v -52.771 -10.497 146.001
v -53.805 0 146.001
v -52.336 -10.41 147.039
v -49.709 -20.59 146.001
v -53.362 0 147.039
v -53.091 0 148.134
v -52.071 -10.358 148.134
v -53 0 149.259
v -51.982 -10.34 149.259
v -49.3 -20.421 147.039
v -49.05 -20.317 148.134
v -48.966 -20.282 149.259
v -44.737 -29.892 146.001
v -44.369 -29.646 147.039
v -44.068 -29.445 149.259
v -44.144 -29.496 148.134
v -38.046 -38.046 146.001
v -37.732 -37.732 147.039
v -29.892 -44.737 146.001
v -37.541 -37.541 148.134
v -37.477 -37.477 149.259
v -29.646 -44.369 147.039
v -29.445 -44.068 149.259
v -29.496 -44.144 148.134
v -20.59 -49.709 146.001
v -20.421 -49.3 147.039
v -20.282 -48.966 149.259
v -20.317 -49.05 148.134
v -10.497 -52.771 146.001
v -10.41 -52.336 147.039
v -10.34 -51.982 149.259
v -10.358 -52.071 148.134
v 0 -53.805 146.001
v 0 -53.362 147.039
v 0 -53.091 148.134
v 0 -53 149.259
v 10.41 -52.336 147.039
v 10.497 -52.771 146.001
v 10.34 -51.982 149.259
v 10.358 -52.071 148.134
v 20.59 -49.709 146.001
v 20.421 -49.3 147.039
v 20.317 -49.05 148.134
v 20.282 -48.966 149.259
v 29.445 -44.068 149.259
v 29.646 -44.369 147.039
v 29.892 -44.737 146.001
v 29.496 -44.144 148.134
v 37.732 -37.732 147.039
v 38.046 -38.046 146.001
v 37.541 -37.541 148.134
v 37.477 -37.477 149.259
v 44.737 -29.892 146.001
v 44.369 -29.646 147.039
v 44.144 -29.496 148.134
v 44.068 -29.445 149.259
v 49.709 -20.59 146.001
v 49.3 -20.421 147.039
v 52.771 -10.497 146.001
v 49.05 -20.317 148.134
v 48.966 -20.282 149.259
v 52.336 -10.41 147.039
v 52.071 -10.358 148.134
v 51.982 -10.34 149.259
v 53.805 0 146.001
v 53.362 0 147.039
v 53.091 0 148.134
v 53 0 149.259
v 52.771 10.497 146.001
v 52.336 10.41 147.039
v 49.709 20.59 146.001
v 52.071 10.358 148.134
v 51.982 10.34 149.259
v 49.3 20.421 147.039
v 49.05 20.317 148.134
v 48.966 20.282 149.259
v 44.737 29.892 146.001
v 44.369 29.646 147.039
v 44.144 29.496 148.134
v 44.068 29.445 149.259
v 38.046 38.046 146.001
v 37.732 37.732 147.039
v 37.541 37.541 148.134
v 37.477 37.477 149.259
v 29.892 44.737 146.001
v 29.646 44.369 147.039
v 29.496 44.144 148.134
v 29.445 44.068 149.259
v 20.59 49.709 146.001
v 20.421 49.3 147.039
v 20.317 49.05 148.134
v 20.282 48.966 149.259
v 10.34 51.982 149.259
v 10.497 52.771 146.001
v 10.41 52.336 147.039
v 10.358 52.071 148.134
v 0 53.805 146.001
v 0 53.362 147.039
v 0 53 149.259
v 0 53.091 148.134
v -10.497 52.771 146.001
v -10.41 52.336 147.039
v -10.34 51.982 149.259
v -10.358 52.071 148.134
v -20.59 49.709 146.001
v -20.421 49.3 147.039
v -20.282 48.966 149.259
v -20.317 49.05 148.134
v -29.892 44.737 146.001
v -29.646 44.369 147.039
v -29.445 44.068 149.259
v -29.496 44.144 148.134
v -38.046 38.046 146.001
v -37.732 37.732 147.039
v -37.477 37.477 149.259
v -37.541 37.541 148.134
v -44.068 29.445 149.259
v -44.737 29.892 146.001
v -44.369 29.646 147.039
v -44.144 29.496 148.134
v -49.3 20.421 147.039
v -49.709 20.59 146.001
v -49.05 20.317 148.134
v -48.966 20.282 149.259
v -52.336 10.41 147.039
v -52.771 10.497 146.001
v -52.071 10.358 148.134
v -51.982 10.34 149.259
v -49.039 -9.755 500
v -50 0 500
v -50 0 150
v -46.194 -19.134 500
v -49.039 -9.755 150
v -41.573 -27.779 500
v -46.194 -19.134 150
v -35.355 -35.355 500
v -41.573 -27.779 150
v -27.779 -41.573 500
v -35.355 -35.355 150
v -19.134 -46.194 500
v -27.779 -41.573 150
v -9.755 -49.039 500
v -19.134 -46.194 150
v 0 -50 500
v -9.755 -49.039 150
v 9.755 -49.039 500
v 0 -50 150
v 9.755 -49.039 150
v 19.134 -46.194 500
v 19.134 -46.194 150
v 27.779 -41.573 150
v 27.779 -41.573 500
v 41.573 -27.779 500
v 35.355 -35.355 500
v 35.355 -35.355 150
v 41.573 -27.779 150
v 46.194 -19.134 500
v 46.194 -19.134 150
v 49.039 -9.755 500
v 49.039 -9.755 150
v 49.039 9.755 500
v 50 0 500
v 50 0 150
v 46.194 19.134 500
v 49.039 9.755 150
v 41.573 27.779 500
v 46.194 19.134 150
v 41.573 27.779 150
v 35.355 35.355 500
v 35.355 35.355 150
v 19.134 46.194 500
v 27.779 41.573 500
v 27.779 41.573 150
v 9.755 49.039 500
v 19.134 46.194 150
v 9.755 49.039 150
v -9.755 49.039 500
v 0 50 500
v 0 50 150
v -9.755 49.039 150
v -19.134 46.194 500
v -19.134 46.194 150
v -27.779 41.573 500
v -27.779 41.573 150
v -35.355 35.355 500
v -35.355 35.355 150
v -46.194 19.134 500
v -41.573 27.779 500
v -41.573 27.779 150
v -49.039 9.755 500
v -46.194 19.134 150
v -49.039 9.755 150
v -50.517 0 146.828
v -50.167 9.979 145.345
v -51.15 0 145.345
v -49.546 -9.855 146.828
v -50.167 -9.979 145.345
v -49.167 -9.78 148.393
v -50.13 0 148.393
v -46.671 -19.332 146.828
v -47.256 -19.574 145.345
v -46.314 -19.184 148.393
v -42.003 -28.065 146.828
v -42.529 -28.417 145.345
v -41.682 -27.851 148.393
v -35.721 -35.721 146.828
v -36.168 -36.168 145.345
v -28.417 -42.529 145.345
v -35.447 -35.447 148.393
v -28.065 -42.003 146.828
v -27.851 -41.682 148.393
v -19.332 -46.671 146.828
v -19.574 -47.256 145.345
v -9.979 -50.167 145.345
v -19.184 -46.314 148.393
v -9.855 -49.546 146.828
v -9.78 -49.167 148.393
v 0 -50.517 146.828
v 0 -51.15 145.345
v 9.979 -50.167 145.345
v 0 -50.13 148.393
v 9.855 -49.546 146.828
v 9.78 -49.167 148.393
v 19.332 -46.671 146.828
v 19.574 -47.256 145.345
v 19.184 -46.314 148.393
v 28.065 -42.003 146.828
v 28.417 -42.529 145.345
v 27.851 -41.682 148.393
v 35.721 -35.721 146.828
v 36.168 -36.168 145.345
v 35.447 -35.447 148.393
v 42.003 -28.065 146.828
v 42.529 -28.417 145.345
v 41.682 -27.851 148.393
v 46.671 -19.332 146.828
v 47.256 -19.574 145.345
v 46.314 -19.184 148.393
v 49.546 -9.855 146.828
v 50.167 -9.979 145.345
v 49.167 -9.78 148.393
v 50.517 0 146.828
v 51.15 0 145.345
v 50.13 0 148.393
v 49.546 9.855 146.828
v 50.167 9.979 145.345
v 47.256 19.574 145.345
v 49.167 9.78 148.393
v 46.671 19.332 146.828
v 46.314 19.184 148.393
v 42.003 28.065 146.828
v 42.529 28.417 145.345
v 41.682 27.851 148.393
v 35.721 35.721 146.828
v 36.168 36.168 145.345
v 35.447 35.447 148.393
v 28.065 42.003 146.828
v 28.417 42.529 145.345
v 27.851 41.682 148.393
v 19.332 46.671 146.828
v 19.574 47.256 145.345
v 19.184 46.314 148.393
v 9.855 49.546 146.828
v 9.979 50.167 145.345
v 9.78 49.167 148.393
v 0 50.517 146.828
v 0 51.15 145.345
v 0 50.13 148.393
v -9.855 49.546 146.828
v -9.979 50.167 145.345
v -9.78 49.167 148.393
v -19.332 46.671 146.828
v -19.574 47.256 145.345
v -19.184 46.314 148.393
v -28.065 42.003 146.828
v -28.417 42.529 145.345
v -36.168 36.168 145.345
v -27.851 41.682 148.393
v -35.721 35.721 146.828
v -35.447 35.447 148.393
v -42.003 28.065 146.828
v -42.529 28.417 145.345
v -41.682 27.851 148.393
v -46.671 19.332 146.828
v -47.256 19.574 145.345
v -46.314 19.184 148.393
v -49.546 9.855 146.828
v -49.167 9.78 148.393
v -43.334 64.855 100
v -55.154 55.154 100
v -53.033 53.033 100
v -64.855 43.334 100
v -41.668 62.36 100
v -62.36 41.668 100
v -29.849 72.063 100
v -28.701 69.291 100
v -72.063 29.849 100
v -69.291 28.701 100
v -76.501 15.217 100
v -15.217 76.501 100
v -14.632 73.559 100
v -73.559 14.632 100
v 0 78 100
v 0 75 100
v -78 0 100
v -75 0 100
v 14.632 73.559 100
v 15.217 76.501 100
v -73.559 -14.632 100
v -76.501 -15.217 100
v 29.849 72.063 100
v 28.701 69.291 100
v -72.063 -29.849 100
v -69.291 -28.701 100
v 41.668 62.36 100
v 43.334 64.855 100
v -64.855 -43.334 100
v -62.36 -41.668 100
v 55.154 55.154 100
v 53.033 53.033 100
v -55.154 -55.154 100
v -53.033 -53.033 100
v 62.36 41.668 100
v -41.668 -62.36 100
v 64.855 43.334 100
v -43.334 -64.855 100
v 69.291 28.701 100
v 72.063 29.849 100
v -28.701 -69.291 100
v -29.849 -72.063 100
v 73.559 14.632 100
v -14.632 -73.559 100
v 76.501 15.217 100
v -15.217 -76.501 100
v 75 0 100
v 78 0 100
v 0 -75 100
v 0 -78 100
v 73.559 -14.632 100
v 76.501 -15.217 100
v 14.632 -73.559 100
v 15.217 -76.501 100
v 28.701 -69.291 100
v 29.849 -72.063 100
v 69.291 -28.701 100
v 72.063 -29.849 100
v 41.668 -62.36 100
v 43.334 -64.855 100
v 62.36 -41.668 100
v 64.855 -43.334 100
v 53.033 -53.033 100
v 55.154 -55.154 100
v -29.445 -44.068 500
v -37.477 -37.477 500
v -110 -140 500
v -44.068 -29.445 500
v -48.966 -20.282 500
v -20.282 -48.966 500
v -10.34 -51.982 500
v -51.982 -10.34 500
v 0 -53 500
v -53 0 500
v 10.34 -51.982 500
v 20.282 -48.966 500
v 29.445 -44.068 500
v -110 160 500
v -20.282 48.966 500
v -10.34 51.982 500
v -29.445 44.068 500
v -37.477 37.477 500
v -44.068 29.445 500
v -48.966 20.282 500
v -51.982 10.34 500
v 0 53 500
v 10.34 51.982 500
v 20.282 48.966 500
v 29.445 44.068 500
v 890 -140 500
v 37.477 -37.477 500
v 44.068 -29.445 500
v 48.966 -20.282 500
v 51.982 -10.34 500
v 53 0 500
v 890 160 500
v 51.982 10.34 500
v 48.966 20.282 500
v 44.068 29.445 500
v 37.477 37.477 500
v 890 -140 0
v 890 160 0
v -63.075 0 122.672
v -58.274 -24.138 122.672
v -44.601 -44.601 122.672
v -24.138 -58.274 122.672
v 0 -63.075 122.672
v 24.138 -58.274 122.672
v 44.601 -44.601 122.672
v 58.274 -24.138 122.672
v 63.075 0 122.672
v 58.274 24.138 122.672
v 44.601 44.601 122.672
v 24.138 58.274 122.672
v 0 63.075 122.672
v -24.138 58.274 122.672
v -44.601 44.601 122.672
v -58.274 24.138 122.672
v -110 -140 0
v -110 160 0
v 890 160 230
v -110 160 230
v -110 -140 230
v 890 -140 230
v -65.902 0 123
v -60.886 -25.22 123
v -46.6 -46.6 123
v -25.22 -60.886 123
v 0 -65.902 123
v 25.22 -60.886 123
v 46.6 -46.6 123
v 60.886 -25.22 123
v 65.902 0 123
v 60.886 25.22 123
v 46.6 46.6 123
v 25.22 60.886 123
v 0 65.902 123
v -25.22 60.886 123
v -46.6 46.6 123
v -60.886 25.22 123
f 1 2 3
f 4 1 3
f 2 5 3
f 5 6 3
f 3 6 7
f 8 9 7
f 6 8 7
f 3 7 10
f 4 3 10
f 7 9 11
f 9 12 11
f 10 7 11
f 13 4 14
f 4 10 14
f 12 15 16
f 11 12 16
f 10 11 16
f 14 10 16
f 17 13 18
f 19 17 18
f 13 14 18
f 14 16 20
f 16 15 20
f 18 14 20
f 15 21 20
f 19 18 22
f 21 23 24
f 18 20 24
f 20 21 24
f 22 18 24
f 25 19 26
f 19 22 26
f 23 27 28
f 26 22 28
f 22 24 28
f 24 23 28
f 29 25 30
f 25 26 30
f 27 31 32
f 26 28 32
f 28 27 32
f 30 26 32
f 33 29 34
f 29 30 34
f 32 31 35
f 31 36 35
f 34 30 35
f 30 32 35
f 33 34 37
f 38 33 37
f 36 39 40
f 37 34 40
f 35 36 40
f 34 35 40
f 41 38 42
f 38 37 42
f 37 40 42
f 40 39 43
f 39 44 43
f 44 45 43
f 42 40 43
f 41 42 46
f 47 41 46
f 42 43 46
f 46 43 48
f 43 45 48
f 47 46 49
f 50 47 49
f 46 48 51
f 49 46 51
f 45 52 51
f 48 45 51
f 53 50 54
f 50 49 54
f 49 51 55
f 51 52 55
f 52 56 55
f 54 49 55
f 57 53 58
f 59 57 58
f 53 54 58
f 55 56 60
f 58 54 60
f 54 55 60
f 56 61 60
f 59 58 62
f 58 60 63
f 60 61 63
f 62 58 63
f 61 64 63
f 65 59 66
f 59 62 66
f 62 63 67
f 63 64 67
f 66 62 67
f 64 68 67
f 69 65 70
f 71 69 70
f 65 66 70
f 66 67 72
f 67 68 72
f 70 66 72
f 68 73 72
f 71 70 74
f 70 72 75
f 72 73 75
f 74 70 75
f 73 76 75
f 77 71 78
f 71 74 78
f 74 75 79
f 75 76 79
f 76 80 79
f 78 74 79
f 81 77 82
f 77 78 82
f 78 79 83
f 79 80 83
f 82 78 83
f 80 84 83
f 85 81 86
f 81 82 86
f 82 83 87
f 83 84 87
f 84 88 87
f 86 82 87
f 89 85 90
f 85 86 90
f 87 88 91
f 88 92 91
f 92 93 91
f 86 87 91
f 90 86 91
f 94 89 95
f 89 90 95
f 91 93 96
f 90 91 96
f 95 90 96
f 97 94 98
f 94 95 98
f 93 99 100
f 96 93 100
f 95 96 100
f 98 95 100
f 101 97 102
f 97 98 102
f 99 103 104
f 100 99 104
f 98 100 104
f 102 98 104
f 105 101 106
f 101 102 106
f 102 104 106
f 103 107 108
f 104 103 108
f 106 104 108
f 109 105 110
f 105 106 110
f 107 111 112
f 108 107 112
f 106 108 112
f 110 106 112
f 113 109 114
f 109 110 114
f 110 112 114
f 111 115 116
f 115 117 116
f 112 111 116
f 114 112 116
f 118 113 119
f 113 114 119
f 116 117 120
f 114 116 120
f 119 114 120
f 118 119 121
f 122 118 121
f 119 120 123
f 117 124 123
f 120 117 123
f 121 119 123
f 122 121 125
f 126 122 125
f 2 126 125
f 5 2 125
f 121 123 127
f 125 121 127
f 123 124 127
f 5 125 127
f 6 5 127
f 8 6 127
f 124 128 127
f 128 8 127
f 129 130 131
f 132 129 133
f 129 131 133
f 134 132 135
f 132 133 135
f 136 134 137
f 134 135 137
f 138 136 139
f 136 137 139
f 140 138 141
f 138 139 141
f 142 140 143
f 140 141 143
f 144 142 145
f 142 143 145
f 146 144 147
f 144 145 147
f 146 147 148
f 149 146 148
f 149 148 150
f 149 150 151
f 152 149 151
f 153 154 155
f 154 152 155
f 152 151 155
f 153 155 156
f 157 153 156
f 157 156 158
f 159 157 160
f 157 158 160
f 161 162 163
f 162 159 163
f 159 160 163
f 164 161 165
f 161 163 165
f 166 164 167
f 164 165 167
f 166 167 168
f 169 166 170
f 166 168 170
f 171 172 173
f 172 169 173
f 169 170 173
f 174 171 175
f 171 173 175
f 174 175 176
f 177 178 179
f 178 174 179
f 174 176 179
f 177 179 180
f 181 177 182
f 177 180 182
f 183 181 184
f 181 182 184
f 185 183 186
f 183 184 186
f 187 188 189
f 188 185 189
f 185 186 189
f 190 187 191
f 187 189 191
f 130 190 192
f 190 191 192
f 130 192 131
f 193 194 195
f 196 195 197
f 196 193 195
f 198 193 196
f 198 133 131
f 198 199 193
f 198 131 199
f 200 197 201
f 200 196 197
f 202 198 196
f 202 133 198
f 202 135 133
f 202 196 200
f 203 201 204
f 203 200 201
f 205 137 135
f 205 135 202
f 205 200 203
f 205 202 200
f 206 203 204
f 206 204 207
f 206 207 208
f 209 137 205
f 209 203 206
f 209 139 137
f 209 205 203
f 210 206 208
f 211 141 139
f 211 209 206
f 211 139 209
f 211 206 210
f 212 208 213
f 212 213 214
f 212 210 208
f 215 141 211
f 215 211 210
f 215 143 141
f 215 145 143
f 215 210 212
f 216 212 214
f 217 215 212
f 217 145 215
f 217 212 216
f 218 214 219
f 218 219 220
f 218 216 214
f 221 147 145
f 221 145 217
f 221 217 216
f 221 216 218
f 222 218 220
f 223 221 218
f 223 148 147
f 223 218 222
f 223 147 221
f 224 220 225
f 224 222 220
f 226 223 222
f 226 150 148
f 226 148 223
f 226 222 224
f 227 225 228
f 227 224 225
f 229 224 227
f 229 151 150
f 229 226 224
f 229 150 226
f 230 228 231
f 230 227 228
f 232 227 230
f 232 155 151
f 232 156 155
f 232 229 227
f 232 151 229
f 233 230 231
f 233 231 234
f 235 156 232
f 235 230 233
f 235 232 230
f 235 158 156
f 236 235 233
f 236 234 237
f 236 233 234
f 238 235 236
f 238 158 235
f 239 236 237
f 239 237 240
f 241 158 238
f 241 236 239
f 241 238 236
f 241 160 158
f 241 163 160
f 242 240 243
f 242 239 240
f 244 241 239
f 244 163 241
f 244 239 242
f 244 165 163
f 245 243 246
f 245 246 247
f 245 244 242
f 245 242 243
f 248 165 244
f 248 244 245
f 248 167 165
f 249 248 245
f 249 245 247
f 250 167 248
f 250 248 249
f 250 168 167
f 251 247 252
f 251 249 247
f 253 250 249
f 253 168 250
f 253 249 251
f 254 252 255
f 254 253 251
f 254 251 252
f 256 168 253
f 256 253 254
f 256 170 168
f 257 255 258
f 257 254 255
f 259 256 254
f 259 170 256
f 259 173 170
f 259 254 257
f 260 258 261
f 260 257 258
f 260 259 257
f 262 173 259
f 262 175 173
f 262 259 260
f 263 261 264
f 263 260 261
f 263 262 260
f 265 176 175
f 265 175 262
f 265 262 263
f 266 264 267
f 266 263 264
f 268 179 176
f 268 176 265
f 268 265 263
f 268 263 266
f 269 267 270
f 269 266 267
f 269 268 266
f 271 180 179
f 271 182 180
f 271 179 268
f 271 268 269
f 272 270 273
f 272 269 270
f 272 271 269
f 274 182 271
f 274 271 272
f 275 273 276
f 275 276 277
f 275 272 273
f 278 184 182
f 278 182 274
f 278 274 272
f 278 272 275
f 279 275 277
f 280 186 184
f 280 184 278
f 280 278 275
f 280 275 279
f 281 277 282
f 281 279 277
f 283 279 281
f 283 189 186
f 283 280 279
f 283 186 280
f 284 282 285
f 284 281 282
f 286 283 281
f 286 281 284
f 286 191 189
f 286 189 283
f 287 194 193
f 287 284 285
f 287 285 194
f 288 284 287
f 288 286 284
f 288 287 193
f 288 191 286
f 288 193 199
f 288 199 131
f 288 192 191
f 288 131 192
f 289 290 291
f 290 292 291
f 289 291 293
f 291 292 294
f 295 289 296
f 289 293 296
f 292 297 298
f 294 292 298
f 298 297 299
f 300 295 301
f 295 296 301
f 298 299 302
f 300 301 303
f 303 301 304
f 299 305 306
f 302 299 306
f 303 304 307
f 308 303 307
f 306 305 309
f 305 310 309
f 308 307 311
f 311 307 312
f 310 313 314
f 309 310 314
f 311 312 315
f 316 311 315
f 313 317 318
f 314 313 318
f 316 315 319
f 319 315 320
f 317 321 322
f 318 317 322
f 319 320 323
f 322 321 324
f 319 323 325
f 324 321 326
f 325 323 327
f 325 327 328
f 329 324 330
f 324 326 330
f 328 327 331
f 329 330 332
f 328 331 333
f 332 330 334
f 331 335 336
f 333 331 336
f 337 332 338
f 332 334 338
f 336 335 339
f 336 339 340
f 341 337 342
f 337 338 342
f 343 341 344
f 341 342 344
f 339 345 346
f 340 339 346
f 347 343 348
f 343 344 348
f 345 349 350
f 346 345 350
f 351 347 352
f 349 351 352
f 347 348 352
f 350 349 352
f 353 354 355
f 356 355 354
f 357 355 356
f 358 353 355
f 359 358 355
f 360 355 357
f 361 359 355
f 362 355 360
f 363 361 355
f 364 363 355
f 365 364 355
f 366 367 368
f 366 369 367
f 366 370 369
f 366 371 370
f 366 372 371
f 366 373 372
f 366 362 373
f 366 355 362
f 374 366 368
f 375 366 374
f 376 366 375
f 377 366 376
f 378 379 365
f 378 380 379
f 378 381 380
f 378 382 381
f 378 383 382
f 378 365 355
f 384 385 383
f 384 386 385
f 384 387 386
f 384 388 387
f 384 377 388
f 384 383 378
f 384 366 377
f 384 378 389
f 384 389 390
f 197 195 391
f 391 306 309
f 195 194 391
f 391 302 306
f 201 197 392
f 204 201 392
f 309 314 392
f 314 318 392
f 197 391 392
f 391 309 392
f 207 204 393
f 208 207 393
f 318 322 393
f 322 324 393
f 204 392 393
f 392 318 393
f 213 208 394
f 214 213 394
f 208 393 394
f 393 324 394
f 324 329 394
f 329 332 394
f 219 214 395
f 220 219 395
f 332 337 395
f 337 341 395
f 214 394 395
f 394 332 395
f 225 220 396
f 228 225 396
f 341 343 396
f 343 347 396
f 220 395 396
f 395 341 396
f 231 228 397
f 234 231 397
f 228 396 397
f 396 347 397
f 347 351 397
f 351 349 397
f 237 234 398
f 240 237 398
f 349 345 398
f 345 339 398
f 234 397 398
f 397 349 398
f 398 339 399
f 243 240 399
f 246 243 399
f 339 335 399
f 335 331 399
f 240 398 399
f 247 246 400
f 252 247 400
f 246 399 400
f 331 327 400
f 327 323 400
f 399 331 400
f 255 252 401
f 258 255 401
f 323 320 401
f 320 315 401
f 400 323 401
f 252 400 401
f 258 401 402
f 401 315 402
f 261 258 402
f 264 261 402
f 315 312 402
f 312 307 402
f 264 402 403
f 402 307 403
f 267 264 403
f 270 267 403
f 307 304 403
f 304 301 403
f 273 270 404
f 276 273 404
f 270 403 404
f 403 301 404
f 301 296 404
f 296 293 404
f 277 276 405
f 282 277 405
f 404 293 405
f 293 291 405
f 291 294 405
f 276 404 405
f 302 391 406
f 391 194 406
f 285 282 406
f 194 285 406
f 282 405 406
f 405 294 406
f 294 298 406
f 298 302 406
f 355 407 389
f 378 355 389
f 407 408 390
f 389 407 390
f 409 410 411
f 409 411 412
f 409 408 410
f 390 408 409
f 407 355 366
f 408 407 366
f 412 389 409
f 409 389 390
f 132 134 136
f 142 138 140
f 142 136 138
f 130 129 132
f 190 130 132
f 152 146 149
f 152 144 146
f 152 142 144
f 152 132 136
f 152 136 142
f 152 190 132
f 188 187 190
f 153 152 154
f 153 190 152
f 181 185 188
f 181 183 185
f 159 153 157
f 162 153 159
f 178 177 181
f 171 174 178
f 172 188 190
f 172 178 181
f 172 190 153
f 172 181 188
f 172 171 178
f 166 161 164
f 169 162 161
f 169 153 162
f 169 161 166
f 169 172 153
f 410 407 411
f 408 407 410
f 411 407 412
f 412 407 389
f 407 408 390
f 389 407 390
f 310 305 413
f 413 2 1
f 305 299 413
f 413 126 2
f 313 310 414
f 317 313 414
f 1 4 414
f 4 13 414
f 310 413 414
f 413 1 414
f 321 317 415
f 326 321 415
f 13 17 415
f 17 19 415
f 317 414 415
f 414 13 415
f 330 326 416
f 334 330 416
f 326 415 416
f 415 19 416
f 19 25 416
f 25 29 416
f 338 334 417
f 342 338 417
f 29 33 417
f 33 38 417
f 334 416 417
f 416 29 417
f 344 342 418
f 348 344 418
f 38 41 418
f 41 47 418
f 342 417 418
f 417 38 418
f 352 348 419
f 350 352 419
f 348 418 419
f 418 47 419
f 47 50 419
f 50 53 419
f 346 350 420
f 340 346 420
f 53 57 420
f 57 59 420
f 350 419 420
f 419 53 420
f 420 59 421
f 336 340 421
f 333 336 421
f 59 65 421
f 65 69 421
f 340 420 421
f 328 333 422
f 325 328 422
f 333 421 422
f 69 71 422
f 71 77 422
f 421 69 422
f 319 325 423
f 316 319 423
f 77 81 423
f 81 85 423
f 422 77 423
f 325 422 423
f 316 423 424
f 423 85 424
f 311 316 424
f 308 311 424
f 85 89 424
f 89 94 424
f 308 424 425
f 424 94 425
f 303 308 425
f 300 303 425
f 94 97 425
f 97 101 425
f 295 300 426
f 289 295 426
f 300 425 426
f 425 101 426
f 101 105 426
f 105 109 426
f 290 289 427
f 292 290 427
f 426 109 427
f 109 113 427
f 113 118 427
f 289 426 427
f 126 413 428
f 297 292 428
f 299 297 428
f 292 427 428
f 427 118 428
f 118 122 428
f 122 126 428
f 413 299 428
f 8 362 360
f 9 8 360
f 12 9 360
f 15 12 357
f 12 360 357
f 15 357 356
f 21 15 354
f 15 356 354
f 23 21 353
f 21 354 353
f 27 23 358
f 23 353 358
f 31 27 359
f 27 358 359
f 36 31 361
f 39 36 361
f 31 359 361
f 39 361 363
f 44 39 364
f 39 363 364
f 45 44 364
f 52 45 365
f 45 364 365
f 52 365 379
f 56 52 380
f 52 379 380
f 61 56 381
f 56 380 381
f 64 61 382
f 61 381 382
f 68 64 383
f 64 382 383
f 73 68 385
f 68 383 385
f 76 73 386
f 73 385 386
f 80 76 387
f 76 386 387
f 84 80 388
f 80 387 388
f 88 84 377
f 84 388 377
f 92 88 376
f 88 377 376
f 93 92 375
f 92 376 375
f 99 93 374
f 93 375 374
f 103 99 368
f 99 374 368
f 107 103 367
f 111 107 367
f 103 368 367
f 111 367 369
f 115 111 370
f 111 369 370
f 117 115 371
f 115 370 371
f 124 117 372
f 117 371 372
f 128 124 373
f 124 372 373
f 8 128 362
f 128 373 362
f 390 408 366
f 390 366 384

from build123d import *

# Parameters (mm, degrees)
BOX_W        = 1000
BOX_H        = 300
BOX_DEPTH    = 500
BOX001_W     = 1000
BOX001_H     = 300
BOX001_DEPTH = 230


with BuildPart() as body:
    # Sketch → Revolution (revolve)
    with BuildSketch(Plane.XZ):
        with BuildLine():
            Line((-50, 649.259148), (-50, 150))
            ThreePointArc((-51.149586, 145.344876), (-50.29165, 147.602515), (-50, 150))
            Line((-51.149586, 145.344876), (-75, 100))
            Line((-75, 100), (-78, 100))
            Line((-78, 100), (-53.804711, 146.000561))
            ThreePointArc((-53.804711, 146.000561), (-53.204155, 147.580909), (-53, 149.259148))
            Line((-53, 149.259148), (-53, 649.259148))
            Line((-53, 649.259148), (-50, 649.259148))
        make_face()
    revolve(axis=Axis((0, 0, 0), (0, 0, 1)))


with BuildPart() as cut:
    # Box → Box (new body)
    with BuildSketch(Plane(origin=(-110, -140, 0), x_dir=(1, 0, 0), z_dir=(0, 0, 1))):
        with Locations((500, 150)):
            Rectangle(BOX_W, BOX_H)
    extrude(amount=BOX_DEPTH)

    # Cut: cut Body
    add(body.part, mode=Mode.SUBTRACT)


with BuildPart() as box001:
    # Box001 → Box001 (new body)
    with BuildSketch(Plane(origin=(-110, -140, 0), x_dir=(1, 0, 0), z_dir=(0, 0, 1))):
        with Locations((500, 150)):
            Rectangle(BOX001_W, BOX001_H)
    extrude(amount=BOX001_DEPTH)


solid = Compound([cut.part, box001.part])
